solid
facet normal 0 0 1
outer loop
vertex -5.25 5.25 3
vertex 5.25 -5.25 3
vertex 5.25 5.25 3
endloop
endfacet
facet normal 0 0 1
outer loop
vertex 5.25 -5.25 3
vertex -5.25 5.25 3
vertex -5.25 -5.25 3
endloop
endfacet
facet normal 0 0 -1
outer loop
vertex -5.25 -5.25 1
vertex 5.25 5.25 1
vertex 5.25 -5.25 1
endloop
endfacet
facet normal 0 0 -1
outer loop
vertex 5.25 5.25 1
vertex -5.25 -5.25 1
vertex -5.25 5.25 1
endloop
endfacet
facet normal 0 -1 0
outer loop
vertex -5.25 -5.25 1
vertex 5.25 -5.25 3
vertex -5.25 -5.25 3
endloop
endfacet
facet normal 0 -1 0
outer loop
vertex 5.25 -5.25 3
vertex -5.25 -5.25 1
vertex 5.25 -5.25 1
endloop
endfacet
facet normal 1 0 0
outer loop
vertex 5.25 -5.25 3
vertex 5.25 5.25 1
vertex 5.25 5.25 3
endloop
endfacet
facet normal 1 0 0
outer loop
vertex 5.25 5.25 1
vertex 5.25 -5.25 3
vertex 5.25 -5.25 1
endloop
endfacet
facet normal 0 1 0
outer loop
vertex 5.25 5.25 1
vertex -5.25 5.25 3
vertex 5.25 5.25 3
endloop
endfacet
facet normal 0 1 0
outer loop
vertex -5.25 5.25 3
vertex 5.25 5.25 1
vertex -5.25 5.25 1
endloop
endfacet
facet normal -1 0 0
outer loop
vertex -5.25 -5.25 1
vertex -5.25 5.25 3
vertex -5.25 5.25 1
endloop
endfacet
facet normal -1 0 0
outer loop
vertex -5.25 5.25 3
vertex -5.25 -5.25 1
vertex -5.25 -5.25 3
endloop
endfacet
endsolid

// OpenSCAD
$fn = 1000;

length = 10.5;
height = 2;


//base quadrant
difference()
{
    translate([-length/2,-length/2,height/2])cube([length,length,height]);
}
